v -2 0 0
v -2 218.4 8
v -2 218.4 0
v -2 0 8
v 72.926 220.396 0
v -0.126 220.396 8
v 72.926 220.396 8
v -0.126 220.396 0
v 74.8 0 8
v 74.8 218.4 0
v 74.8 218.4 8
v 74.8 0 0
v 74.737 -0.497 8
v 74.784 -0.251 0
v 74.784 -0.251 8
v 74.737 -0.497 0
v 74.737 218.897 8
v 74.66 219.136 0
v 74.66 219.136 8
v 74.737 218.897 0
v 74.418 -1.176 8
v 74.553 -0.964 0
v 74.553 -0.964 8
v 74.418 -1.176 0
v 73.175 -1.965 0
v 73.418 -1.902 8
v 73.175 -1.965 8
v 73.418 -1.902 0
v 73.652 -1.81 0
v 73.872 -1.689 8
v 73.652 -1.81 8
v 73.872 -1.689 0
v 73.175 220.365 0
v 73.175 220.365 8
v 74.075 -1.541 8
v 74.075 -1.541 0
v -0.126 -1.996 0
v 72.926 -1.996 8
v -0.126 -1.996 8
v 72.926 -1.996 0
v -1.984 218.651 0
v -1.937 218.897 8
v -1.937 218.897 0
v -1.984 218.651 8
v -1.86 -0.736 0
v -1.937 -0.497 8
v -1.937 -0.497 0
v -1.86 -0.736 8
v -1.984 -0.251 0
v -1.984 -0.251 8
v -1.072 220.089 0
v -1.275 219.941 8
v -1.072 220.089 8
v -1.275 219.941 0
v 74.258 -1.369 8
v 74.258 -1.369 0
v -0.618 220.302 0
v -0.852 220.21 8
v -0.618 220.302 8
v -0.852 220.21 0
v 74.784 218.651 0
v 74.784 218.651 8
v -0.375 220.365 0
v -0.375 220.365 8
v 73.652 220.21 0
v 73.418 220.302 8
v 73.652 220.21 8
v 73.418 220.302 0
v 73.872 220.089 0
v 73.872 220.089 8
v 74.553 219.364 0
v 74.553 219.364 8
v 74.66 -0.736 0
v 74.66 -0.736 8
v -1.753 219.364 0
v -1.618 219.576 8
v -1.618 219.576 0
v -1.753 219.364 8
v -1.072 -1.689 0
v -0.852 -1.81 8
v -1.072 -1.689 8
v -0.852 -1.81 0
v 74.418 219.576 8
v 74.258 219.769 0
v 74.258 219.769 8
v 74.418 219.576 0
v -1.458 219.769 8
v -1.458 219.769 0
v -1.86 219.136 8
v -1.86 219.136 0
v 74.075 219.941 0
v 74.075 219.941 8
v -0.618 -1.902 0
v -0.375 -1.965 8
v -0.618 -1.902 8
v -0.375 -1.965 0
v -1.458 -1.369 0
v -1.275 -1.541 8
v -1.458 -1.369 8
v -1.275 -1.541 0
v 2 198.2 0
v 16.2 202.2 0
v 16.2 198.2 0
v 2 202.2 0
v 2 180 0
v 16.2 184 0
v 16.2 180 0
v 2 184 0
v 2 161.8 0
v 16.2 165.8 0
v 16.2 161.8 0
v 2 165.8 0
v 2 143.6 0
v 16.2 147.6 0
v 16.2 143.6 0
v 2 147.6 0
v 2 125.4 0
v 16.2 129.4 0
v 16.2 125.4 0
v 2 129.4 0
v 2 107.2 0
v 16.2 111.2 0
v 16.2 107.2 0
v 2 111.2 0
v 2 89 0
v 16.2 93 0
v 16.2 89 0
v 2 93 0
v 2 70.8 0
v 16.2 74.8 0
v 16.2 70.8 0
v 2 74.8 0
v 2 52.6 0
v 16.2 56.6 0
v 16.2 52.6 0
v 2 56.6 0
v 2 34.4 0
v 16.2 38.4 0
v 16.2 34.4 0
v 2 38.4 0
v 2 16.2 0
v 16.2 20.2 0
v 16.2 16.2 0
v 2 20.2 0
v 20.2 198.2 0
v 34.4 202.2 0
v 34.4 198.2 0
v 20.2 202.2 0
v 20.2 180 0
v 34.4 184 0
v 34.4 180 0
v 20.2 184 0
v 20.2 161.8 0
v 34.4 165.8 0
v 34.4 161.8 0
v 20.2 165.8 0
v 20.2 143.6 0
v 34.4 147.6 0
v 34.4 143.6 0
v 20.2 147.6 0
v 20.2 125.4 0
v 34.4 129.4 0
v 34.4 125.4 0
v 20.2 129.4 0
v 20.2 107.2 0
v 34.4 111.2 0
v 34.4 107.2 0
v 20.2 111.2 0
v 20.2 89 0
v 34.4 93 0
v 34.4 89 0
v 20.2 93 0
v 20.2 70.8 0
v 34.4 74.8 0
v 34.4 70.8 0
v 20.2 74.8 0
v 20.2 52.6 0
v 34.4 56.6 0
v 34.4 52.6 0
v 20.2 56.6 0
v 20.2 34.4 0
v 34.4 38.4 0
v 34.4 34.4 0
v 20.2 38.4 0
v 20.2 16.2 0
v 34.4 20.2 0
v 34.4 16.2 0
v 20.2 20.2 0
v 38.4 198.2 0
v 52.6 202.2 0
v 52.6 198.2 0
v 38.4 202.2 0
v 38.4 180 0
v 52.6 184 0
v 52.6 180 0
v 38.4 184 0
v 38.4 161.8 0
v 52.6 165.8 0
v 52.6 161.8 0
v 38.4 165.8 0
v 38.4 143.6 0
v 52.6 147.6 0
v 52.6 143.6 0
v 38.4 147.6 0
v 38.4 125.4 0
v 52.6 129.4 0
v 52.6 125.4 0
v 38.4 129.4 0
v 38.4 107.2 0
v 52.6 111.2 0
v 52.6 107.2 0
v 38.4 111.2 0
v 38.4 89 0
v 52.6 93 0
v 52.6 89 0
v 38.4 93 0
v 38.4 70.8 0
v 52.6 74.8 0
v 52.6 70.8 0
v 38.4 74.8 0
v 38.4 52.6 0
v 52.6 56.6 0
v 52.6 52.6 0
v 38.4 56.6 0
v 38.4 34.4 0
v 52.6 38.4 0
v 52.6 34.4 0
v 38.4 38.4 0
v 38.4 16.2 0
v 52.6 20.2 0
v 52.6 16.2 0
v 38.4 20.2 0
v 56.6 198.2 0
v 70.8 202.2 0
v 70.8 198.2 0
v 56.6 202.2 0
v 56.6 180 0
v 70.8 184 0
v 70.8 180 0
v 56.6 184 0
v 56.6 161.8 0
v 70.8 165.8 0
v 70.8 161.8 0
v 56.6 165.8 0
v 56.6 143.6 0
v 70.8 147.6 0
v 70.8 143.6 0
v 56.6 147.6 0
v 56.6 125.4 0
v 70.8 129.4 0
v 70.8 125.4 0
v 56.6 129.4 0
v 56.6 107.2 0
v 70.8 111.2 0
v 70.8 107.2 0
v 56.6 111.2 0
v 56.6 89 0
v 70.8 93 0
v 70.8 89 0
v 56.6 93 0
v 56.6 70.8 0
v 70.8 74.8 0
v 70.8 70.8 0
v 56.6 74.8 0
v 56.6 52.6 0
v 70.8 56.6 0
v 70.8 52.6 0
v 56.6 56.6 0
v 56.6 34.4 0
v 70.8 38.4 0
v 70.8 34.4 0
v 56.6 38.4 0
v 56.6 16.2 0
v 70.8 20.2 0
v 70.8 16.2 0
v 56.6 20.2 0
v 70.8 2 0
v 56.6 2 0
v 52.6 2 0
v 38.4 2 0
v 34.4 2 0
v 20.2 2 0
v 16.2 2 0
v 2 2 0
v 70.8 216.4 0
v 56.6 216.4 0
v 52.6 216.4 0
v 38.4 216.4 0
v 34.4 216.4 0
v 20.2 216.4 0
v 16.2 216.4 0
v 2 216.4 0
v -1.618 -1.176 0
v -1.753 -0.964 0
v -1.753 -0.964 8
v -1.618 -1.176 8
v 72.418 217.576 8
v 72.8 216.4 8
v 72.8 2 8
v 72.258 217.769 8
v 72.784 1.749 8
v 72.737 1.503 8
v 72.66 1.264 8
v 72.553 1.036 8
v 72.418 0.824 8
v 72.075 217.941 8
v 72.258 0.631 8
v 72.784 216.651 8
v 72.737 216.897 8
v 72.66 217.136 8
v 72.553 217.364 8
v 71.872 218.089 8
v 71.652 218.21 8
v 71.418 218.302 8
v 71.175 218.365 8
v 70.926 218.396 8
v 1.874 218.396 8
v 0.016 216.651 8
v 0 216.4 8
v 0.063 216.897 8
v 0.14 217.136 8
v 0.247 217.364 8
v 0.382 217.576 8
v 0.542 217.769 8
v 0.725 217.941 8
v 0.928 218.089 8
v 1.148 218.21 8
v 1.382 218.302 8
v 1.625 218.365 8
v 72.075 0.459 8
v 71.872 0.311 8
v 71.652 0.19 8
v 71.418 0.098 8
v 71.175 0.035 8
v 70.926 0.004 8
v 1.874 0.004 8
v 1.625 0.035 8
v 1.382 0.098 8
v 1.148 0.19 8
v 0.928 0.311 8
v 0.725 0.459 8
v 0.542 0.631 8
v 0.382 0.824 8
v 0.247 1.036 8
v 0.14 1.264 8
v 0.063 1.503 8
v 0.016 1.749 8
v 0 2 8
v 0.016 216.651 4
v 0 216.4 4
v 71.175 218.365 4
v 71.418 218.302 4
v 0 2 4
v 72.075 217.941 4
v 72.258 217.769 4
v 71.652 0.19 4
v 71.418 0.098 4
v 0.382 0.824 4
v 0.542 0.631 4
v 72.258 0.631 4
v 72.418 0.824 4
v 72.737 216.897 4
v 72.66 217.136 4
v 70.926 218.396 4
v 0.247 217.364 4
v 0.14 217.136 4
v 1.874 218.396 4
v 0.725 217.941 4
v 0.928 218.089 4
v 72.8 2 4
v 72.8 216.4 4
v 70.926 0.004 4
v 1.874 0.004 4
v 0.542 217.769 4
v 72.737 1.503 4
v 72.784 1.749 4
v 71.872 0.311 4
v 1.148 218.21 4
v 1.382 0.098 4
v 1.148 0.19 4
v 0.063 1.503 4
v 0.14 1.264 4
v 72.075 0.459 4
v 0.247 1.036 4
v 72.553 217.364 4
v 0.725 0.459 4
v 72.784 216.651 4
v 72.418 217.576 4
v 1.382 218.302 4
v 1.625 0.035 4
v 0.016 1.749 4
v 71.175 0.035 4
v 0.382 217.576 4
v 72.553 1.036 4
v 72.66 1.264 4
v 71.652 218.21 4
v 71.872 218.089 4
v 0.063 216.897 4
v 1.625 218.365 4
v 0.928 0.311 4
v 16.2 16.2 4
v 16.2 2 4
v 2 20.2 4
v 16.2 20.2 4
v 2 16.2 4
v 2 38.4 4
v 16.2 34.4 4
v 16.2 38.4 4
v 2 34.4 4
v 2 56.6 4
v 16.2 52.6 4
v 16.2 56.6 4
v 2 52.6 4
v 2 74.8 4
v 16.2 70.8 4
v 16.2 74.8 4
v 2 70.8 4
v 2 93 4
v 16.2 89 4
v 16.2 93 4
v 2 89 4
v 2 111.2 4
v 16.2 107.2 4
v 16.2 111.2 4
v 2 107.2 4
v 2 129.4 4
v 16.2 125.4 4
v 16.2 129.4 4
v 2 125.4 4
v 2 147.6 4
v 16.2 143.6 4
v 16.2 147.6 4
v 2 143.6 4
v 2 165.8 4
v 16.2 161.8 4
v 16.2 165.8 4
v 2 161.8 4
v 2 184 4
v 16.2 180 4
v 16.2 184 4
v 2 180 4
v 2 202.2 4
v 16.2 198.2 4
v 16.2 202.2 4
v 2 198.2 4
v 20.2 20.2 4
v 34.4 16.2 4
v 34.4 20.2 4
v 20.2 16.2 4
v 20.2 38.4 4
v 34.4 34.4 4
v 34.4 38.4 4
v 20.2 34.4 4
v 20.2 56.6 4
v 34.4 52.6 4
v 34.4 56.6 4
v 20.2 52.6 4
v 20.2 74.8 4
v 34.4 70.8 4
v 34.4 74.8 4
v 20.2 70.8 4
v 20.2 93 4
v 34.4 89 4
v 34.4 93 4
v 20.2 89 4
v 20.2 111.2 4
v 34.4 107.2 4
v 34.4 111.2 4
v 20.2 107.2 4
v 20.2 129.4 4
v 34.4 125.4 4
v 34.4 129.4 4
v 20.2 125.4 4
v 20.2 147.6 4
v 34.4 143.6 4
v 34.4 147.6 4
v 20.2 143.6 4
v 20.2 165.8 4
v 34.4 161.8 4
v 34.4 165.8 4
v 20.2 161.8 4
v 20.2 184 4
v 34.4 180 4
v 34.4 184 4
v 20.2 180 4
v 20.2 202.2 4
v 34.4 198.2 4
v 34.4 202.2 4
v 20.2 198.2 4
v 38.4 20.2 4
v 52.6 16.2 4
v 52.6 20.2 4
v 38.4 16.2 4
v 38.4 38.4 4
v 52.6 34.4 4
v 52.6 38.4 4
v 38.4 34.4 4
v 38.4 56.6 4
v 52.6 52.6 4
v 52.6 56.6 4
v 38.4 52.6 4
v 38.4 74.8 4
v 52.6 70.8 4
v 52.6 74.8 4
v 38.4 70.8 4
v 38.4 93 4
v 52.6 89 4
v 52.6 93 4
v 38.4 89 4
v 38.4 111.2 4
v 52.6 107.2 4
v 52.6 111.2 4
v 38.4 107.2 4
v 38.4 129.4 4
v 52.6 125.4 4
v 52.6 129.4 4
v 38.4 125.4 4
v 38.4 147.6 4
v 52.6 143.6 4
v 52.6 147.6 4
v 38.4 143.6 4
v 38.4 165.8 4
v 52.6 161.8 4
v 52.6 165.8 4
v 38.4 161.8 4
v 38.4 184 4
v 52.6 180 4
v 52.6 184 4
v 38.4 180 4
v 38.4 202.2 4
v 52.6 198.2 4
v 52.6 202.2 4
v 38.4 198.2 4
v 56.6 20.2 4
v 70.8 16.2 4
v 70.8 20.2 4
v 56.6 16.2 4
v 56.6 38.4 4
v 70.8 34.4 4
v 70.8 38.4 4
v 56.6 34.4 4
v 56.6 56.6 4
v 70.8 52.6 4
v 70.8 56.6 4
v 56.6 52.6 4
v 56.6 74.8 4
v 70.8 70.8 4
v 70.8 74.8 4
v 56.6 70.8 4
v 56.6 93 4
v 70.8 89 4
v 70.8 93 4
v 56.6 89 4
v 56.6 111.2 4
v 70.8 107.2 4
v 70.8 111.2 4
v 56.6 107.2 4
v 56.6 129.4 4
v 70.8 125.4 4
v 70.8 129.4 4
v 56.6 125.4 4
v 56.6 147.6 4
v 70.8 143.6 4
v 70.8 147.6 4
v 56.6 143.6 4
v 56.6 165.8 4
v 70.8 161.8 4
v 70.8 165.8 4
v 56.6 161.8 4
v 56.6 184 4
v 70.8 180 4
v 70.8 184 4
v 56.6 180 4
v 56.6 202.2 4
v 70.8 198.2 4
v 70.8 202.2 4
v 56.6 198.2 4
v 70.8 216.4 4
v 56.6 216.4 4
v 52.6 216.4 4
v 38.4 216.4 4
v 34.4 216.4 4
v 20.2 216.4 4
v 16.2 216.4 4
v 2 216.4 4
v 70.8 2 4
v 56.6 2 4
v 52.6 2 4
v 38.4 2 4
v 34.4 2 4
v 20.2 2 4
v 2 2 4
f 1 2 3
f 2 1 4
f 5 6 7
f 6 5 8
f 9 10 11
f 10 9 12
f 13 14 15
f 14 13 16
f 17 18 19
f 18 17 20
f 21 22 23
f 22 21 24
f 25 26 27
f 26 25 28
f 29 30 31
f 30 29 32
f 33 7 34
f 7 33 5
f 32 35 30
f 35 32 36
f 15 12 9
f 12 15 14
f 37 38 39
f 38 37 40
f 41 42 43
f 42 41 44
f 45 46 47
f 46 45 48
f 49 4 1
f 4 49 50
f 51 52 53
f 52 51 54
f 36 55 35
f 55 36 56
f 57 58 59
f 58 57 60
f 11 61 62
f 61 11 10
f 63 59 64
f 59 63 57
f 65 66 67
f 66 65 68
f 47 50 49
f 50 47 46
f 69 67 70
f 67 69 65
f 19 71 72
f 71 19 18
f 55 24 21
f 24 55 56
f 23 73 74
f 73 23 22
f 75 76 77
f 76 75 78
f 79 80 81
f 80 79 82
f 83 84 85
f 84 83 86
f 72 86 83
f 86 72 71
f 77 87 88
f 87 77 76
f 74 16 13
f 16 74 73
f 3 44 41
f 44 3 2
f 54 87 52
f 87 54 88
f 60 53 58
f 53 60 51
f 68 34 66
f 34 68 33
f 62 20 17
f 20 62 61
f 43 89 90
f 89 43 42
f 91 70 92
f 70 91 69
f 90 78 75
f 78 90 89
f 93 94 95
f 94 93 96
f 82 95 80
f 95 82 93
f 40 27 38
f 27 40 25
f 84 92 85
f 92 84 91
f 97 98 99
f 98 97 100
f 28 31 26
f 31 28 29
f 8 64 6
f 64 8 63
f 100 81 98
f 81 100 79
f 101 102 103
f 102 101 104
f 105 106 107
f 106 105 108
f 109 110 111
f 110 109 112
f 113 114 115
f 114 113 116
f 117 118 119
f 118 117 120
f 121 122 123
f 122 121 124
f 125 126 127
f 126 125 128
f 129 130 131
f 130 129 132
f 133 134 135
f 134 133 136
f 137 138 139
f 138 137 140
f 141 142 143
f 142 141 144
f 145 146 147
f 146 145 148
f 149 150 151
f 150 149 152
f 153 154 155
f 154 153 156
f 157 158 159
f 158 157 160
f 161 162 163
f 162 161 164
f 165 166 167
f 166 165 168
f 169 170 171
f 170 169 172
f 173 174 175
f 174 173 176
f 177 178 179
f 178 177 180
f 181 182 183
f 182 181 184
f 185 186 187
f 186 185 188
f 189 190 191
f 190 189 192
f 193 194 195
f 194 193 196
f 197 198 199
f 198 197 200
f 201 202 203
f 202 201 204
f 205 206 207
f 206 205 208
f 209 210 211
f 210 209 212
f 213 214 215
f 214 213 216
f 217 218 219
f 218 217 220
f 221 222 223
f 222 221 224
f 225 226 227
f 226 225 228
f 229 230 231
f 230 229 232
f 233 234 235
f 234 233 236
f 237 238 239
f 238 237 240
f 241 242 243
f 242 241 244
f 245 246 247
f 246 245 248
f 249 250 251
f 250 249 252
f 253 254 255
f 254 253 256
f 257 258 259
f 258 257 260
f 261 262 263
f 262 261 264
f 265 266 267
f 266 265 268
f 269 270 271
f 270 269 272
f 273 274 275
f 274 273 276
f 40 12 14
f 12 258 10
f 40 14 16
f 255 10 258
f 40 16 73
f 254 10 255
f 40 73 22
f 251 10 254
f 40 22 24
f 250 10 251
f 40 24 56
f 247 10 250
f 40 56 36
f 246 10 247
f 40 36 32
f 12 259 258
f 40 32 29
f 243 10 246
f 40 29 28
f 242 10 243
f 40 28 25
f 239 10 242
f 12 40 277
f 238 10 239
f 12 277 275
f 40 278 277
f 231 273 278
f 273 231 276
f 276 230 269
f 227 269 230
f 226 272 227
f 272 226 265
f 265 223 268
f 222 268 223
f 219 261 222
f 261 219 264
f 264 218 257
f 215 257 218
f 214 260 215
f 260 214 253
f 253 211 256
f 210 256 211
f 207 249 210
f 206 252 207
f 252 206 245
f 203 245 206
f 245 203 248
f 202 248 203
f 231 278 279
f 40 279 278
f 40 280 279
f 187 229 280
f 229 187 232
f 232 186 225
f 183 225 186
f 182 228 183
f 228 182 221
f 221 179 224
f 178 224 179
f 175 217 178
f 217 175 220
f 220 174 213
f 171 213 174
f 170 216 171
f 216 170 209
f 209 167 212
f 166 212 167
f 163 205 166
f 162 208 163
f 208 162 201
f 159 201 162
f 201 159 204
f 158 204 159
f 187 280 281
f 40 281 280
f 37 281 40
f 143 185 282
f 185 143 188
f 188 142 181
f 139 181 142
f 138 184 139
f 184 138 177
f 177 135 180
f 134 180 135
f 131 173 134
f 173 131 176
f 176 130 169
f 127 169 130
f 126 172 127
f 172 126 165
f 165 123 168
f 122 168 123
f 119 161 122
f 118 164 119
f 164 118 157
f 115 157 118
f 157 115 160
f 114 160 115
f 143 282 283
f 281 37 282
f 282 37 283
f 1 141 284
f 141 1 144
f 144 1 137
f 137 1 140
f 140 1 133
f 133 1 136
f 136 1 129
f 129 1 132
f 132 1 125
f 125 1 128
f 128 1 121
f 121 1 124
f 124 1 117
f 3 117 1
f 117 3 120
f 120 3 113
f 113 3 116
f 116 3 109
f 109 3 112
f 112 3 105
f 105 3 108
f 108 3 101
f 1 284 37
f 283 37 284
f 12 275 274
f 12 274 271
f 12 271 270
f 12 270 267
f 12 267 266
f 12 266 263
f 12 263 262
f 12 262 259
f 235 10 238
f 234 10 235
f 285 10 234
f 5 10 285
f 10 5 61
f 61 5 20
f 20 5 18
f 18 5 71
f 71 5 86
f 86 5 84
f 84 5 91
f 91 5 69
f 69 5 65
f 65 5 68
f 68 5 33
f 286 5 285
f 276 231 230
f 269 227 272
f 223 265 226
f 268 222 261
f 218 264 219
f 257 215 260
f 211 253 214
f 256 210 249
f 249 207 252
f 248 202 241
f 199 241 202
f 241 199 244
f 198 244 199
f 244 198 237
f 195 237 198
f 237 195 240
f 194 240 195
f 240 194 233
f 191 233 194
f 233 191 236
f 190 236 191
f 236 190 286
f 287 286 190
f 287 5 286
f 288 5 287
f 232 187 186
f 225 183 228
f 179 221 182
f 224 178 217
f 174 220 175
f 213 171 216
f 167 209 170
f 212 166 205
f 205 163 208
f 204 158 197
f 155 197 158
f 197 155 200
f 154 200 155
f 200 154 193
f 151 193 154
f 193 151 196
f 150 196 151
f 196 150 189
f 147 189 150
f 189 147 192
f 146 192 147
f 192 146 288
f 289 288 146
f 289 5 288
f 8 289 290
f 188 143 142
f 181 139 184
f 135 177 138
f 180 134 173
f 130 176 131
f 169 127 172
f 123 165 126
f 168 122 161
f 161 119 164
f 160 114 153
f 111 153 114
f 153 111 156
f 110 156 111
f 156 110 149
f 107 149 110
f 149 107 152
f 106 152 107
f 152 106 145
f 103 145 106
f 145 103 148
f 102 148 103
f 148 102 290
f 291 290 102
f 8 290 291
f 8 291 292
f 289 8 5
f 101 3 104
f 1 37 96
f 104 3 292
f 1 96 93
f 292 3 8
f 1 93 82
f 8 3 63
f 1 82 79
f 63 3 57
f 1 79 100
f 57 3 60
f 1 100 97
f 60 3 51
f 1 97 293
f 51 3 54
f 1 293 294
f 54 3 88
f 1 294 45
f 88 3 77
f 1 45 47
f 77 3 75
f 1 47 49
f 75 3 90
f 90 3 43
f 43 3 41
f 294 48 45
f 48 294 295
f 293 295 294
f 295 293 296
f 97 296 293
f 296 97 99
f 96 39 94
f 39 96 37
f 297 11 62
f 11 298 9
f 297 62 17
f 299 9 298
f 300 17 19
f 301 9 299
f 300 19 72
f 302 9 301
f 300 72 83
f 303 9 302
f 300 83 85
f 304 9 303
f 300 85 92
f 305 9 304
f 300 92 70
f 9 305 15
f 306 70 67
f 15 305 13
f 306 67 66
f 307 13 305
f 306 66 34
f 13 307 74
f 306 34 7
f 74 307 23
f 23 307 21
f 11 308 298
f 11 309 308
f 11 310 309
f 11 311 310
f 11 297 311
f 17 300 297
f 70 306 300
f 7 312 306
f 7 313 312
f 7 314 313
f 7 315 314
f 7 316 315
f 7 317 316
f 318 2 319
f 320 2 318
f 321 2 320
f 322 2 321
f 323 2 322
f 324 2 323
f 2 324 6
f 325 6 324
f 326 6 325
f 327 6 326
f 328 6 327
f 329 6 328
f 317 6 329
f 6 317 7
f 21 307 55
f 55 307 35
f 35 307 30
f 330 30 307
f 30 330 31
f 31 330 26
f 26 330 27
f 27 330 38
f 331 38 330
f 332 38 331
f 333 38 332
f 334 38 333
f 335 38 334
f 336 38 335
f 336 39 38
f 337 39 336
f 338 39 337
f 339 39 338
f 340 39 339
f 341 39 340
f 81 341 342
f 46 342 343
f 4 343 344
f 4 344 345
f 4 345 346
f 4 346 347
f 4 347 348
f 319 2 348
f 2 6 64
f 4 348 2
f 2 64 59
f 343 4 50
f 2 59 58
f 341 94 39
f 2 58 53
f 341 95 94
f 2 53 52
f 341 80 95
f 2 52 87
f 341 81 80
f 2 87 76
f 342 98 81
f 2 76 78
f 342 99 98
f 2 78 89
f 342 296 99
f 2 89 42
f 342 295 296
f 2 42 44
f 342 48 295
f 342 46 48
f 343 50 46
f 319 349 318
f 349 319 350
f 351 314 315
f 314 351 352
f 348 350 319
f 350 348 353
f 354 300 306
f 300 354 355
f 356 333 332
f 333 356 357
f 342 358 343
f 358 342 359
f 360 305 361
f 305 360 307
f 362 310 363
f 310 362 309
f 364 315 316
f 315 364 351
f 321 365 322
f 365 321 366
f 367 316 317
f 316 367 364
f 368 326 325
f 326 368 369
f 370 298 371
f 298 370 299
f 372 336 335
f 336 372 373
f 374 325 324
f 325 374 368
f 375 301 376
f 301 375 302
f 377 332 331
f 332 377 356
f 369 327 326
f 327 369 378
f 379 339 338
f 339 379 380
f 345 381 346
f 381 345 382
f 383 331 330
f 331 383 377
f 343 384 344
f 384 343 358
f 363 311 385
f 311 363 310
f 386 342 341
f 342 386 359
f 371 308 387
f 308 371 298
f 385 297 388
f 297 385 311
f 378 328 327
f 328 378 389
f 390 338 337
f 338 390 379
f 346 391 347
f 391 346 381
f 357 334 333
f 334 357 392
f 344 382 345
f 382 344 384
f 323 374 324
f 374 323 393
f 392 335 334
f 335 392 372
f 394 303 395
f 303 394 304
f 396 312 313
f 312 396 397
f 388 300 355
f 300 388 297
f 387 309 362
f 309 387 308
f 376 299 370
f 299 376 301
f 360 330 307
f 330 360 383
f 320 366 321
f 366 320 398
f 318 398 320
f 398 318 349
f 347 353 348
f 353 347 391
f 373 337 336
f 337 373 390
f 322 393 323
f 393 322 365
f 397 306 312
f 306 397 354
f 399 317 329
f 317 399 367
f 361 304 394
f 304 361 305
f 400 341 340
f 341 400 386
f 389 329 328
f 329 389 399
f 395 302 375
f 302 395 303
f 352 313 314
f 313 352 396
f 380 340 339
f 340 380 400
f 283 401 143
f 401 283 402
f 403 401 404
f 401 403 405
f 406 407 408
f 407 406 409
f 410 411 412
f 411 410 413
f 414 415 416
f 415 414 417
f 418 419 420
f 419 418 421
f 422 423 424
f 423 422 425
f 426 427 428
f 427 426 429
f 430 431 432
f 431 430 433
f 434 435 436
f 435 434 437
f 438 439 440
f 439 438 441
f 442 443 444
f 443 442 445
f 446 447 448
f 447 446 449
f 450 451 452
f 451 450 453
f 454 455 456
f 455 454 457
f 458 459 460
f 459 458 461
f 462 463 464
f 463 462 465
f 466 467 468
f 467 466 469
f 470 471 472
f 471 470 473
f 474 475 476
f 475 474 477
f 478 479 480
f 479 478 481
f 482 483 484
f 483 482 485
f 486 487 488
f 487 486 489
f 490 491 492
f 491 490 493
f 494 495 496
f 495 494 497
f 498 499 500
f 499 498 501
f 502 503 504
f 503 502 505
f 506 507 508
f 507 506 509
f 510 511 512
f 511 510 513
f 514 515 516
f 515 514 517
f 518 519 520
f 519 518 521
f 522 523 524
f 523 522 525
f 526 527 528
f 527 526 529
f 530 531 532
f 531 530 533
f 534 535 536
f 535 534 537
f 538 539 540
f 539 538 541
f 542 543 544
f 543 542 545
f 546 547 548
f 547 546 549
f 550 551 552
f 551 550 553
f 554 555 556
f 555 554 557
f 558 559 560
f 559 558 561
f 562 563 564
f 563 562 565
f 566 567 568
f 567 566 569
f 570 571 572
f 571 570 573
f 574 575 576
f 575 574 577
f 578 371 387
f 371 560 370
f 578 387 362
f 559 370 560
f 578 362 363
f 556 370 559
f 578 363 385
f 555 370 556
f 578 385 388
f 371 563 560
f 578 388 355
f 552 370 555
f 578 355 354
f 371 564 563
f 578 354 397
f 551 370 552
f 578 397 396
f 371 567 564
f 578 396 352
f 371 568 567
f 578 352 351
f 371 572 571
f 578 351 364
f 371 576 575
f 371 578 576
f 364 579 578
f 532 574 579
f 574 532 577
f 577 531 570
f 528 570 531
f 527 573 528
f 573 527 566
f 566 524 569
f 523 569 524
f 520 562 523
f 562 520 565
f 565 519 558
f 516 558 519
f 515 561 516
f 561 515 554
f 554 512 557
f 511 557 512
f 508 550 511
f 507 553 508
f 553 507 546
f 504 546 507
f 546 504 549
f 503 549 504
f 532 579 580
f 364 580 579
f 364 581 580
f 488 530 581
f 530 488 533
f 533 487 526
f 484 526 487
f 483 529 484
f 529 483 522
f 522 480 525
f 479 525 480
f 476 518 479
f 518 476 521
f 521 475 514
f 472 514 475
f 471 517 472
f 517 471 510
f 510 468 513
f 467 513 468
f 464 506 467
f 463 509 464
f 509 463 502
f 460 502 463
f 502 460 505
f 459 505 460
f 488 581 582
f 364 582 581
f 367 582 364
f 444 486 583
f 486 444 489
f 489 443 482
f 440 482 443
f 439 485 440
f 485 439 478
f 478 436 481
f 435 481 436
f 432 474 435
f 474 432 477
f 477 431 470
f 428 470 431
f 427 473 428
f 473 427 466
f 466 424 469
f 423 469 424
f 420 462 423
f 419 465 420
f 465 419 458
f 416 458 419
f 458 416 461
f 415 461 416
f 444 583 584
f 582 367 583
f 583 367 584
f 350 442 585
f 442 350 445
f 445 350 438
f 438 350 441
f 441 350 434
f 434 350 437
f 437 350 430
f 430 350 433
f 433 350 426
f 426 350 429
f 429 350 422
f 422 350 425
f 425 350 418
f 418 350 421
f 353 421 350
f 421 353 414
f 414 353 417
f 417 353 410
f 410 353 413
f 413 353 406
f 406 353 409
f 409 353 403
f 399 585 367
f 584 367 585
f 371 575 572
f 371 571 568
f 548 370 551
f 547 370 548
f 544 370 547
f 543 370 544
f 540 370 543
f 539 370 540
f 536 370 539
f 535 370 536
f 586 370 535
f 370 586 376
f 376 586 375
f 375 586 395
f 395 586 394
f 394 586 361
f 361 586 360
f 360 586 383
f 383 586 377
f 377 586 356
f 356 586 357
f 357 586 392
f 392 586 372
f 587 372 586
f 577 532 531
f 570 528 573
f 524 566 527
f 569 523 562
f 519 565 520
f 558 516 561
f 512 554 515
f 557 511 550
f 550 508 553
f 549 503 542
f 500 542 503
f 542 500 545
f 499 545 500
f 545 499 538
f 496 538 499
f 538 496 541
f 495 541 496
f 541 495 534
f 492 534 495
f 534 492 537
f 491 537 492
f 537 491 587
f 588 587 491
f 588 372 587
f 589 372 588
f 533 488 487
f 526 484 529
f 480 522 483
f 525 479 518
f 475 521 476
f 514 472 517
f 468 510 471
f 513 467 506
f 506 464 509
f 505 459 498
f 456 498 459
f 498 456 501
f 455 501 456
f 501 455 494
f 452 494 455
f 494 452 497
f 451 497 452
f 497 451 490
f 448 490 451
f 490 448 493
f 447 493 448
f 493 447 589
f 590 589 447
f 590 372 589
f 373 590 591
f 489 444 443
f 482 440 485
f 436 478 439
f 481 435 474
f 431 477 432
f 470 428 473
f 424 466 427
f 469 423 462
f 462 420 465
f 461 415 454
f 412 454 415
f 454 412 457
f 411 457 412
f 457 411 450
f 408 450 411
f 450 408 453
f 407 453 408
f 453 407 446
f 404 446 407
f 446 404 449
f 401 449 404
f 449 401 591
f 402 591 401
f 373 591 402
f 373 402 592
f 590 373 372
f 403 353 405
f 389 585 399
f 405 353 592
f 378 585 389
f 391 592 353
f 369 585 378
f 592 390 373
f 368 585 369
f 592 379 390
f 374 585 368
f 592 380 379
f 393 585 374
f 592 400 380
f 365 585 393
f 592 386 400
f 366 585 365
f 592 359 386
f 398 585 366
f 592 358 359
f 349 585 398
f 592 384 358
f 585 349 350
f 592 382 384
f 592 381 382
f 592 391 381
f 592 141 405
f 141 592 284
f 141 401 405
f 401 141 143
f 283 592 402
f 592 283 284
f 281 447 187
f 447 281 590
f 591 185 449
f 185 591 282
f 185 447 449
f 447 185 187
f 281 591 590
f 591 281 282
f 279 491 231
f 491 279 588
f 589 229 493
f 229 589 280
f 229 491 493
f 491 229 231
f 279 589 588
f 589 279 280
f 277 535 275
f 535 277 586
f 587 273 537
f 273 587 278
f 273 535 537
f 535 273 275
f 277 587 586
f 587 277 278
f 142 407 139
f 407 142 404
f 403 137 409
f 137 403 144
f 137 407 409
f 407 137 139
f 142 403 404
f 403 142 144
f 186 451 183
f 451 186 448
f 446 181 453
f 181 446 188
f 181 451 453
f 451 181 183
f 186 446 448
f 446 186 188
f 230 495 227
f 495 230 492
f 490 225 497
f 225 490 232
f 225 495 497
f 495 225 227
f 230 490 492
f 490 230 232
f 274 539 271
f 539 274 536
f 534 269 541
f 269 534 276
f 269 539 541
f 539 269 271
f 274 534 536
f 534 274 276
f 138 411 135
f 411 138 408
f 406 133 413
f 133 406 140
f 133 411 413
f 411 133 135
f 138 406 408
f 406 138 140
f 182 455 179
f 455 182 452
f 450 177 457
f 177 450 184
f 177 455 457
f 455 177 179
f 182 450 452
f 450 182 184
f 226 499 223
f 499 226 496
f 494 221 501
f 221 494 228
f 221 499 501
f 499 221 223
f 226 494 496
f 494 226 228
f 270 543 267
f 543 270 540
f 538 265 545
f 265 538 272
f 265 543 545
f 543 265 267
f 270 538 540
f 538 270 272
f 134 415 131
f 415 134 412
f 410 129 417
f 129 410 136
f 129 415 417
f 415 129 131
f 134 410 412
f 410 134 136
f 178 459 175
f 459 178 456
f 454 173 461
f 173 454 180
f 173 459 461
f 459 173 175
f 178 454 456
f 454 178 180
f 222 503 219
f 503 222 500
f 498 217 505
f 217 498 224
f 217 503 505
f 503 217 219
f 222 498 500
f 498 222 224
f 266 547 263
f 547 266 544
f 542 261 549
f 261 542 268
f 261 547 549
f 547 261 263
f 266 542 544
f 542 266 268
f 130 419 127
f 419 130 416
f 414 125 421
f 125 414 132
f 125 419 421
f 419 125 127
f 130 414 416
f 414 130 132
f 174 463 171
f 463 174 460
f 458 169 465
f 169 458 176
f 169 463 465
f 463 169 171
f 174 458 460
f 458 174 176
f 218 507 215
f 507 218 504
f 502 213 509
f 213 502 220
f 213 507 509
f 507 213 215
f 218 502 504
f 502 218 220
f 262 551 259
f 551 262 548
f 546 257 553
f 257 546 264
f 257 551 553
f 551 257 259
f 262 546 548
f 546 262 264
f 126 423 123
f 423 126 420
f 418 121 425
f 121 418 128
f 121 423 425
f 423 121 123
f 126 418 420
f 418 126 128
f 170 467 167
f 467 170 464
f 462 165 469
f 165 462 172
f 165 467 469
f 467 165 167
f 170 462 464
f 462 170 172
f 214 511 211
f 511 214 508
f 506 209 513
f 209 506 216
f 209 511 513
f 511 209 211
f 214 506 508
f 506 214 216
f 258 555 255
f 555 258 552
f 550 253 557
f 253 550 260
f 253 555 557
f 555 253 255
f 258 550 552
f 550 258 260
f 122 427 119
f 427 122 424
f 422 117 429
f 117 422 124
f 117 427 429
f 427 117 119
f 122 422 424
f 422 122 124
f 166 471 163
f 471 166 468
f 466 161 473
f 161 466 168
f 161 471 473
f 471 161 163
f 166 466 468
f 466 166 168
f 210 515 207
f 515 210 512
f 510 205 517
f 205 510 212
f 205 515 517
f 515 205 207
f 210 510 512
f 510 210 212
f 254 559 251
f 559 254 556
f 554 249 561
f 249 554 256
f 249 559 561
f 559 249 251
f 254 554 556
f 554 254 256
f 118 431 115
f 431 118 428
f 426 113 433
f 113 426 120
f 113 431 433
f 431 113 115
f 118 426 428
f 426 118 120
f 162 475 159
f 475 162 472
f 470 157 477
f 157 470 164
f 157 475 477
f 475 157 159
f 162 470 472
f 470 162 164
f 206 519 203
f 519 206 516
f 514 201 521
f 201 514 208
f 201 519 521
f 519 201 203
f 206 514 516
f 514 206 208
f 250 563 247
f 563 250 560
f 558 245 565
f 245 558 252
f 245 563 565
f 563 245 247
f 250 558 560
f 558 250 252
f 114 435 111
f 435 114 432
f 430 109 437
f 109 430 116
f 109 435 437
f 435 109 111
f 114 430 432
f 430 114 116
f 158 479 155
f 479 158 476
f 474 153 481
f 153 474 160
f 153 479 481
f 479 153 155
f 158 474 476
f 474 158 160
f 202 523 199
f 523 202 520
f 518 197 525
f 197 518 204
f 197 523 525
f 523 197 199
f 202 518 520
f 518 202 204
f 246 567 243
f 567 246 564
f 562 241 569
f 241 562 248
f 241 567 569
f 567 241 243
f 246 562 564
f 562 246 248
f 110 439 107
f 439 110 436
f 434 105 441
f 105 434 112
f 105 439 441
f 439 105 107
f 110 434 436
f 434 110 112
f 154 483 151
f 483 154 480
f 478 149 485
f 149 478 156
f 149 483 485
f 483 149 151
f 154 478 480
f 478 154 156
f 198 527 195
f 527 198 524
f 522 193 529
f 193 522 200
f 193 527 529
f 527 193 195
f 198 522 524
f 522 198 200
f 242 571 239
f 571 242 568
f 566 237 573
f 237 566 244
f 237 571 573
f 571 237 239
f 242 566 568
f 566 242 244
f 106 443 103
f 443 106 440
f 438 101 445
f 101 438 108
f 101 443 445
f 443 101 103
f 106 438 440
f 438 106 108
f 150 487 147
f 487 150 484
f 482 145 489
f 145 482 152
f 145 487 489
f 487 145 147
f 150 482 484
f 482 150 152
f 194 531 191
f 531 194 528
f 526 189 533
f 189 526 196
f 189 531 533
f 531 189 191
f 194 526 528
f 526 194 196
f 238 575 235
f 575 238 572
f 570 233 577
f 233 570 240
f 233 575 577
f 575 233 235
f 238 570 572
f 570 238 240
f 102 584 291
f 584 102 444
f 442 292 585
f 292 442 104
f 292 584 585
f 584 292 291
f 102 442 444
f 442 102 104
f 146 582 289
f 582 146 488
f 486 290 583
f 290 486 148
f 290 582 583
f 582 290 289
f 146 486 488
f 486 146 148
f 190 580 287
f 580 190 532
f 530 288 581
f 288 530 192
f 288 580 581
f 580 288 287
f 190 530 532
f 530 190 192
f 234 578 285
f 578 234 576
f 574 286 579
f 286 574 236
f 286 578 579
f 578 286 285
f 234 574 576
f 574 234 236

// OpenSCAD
$fn=50;
plateZ=2;
rows=4;
columns=12;
switchSide = 14.2;
switchMargin = 4;
plateMargin=0;
plateBoxZ=4;
plateBoxThickness=2;

minkowskiCylinderRadius=2;


//plateW=columns*(switchSide + switchMargin)+2*plateMargin - switchMargin;
//plateH=rows*(switchSide + switchMargin)+2*plateMargin - switchMargin;

plateW=(columns*switchSide) + (columns-1)*switchMargin +2*plateMargin;
plateH=(rows*switchSide) + (rows-1)*switchMargin +2*plateMargin;

echo("plateW=", plateW, " plateH=", plateH);

module platePlane(){
minkowski()
{
  cube([plateH,plateW,plateZ]);
  cylinder(r=minkowskiCylinderRadius,h=plateZ);
}
}

module plateBox(){
    difference(){
        
        minkowski()
        {
          cube([plateH+plateBoxThickness*2,plateW+plateBoxThickness*2,plateBoxZ]);
          cylinder(r=minkowskiCylinderRadius,h=plateBoxZ);
        }
        
        translate([plateBoxThickness,plateBoxThickness,0])
        minkowski()
        {
          cube([plateH,plateW,plateBoxZ]);
          cylinder(r=minkowskiCylinderRadius,h=plateBoxZ);
        }
        
        
    }

}


module holes(){
for(i=[0:columns-1]){
    for(j=[0:rows-1]){
        translate([(switchSide+switchMargin)*j,(switchSide+switchMargin)*i,0])
        cube([switchSide,switchSide,4]);
    }
    
}
}


plateBox();
translate([plateBoxThickness,plateBoxThickness,0])
difference(){
    platePlane();
    translate([plateMargin,plateMargin,0])
    holes();
    }





 


   
